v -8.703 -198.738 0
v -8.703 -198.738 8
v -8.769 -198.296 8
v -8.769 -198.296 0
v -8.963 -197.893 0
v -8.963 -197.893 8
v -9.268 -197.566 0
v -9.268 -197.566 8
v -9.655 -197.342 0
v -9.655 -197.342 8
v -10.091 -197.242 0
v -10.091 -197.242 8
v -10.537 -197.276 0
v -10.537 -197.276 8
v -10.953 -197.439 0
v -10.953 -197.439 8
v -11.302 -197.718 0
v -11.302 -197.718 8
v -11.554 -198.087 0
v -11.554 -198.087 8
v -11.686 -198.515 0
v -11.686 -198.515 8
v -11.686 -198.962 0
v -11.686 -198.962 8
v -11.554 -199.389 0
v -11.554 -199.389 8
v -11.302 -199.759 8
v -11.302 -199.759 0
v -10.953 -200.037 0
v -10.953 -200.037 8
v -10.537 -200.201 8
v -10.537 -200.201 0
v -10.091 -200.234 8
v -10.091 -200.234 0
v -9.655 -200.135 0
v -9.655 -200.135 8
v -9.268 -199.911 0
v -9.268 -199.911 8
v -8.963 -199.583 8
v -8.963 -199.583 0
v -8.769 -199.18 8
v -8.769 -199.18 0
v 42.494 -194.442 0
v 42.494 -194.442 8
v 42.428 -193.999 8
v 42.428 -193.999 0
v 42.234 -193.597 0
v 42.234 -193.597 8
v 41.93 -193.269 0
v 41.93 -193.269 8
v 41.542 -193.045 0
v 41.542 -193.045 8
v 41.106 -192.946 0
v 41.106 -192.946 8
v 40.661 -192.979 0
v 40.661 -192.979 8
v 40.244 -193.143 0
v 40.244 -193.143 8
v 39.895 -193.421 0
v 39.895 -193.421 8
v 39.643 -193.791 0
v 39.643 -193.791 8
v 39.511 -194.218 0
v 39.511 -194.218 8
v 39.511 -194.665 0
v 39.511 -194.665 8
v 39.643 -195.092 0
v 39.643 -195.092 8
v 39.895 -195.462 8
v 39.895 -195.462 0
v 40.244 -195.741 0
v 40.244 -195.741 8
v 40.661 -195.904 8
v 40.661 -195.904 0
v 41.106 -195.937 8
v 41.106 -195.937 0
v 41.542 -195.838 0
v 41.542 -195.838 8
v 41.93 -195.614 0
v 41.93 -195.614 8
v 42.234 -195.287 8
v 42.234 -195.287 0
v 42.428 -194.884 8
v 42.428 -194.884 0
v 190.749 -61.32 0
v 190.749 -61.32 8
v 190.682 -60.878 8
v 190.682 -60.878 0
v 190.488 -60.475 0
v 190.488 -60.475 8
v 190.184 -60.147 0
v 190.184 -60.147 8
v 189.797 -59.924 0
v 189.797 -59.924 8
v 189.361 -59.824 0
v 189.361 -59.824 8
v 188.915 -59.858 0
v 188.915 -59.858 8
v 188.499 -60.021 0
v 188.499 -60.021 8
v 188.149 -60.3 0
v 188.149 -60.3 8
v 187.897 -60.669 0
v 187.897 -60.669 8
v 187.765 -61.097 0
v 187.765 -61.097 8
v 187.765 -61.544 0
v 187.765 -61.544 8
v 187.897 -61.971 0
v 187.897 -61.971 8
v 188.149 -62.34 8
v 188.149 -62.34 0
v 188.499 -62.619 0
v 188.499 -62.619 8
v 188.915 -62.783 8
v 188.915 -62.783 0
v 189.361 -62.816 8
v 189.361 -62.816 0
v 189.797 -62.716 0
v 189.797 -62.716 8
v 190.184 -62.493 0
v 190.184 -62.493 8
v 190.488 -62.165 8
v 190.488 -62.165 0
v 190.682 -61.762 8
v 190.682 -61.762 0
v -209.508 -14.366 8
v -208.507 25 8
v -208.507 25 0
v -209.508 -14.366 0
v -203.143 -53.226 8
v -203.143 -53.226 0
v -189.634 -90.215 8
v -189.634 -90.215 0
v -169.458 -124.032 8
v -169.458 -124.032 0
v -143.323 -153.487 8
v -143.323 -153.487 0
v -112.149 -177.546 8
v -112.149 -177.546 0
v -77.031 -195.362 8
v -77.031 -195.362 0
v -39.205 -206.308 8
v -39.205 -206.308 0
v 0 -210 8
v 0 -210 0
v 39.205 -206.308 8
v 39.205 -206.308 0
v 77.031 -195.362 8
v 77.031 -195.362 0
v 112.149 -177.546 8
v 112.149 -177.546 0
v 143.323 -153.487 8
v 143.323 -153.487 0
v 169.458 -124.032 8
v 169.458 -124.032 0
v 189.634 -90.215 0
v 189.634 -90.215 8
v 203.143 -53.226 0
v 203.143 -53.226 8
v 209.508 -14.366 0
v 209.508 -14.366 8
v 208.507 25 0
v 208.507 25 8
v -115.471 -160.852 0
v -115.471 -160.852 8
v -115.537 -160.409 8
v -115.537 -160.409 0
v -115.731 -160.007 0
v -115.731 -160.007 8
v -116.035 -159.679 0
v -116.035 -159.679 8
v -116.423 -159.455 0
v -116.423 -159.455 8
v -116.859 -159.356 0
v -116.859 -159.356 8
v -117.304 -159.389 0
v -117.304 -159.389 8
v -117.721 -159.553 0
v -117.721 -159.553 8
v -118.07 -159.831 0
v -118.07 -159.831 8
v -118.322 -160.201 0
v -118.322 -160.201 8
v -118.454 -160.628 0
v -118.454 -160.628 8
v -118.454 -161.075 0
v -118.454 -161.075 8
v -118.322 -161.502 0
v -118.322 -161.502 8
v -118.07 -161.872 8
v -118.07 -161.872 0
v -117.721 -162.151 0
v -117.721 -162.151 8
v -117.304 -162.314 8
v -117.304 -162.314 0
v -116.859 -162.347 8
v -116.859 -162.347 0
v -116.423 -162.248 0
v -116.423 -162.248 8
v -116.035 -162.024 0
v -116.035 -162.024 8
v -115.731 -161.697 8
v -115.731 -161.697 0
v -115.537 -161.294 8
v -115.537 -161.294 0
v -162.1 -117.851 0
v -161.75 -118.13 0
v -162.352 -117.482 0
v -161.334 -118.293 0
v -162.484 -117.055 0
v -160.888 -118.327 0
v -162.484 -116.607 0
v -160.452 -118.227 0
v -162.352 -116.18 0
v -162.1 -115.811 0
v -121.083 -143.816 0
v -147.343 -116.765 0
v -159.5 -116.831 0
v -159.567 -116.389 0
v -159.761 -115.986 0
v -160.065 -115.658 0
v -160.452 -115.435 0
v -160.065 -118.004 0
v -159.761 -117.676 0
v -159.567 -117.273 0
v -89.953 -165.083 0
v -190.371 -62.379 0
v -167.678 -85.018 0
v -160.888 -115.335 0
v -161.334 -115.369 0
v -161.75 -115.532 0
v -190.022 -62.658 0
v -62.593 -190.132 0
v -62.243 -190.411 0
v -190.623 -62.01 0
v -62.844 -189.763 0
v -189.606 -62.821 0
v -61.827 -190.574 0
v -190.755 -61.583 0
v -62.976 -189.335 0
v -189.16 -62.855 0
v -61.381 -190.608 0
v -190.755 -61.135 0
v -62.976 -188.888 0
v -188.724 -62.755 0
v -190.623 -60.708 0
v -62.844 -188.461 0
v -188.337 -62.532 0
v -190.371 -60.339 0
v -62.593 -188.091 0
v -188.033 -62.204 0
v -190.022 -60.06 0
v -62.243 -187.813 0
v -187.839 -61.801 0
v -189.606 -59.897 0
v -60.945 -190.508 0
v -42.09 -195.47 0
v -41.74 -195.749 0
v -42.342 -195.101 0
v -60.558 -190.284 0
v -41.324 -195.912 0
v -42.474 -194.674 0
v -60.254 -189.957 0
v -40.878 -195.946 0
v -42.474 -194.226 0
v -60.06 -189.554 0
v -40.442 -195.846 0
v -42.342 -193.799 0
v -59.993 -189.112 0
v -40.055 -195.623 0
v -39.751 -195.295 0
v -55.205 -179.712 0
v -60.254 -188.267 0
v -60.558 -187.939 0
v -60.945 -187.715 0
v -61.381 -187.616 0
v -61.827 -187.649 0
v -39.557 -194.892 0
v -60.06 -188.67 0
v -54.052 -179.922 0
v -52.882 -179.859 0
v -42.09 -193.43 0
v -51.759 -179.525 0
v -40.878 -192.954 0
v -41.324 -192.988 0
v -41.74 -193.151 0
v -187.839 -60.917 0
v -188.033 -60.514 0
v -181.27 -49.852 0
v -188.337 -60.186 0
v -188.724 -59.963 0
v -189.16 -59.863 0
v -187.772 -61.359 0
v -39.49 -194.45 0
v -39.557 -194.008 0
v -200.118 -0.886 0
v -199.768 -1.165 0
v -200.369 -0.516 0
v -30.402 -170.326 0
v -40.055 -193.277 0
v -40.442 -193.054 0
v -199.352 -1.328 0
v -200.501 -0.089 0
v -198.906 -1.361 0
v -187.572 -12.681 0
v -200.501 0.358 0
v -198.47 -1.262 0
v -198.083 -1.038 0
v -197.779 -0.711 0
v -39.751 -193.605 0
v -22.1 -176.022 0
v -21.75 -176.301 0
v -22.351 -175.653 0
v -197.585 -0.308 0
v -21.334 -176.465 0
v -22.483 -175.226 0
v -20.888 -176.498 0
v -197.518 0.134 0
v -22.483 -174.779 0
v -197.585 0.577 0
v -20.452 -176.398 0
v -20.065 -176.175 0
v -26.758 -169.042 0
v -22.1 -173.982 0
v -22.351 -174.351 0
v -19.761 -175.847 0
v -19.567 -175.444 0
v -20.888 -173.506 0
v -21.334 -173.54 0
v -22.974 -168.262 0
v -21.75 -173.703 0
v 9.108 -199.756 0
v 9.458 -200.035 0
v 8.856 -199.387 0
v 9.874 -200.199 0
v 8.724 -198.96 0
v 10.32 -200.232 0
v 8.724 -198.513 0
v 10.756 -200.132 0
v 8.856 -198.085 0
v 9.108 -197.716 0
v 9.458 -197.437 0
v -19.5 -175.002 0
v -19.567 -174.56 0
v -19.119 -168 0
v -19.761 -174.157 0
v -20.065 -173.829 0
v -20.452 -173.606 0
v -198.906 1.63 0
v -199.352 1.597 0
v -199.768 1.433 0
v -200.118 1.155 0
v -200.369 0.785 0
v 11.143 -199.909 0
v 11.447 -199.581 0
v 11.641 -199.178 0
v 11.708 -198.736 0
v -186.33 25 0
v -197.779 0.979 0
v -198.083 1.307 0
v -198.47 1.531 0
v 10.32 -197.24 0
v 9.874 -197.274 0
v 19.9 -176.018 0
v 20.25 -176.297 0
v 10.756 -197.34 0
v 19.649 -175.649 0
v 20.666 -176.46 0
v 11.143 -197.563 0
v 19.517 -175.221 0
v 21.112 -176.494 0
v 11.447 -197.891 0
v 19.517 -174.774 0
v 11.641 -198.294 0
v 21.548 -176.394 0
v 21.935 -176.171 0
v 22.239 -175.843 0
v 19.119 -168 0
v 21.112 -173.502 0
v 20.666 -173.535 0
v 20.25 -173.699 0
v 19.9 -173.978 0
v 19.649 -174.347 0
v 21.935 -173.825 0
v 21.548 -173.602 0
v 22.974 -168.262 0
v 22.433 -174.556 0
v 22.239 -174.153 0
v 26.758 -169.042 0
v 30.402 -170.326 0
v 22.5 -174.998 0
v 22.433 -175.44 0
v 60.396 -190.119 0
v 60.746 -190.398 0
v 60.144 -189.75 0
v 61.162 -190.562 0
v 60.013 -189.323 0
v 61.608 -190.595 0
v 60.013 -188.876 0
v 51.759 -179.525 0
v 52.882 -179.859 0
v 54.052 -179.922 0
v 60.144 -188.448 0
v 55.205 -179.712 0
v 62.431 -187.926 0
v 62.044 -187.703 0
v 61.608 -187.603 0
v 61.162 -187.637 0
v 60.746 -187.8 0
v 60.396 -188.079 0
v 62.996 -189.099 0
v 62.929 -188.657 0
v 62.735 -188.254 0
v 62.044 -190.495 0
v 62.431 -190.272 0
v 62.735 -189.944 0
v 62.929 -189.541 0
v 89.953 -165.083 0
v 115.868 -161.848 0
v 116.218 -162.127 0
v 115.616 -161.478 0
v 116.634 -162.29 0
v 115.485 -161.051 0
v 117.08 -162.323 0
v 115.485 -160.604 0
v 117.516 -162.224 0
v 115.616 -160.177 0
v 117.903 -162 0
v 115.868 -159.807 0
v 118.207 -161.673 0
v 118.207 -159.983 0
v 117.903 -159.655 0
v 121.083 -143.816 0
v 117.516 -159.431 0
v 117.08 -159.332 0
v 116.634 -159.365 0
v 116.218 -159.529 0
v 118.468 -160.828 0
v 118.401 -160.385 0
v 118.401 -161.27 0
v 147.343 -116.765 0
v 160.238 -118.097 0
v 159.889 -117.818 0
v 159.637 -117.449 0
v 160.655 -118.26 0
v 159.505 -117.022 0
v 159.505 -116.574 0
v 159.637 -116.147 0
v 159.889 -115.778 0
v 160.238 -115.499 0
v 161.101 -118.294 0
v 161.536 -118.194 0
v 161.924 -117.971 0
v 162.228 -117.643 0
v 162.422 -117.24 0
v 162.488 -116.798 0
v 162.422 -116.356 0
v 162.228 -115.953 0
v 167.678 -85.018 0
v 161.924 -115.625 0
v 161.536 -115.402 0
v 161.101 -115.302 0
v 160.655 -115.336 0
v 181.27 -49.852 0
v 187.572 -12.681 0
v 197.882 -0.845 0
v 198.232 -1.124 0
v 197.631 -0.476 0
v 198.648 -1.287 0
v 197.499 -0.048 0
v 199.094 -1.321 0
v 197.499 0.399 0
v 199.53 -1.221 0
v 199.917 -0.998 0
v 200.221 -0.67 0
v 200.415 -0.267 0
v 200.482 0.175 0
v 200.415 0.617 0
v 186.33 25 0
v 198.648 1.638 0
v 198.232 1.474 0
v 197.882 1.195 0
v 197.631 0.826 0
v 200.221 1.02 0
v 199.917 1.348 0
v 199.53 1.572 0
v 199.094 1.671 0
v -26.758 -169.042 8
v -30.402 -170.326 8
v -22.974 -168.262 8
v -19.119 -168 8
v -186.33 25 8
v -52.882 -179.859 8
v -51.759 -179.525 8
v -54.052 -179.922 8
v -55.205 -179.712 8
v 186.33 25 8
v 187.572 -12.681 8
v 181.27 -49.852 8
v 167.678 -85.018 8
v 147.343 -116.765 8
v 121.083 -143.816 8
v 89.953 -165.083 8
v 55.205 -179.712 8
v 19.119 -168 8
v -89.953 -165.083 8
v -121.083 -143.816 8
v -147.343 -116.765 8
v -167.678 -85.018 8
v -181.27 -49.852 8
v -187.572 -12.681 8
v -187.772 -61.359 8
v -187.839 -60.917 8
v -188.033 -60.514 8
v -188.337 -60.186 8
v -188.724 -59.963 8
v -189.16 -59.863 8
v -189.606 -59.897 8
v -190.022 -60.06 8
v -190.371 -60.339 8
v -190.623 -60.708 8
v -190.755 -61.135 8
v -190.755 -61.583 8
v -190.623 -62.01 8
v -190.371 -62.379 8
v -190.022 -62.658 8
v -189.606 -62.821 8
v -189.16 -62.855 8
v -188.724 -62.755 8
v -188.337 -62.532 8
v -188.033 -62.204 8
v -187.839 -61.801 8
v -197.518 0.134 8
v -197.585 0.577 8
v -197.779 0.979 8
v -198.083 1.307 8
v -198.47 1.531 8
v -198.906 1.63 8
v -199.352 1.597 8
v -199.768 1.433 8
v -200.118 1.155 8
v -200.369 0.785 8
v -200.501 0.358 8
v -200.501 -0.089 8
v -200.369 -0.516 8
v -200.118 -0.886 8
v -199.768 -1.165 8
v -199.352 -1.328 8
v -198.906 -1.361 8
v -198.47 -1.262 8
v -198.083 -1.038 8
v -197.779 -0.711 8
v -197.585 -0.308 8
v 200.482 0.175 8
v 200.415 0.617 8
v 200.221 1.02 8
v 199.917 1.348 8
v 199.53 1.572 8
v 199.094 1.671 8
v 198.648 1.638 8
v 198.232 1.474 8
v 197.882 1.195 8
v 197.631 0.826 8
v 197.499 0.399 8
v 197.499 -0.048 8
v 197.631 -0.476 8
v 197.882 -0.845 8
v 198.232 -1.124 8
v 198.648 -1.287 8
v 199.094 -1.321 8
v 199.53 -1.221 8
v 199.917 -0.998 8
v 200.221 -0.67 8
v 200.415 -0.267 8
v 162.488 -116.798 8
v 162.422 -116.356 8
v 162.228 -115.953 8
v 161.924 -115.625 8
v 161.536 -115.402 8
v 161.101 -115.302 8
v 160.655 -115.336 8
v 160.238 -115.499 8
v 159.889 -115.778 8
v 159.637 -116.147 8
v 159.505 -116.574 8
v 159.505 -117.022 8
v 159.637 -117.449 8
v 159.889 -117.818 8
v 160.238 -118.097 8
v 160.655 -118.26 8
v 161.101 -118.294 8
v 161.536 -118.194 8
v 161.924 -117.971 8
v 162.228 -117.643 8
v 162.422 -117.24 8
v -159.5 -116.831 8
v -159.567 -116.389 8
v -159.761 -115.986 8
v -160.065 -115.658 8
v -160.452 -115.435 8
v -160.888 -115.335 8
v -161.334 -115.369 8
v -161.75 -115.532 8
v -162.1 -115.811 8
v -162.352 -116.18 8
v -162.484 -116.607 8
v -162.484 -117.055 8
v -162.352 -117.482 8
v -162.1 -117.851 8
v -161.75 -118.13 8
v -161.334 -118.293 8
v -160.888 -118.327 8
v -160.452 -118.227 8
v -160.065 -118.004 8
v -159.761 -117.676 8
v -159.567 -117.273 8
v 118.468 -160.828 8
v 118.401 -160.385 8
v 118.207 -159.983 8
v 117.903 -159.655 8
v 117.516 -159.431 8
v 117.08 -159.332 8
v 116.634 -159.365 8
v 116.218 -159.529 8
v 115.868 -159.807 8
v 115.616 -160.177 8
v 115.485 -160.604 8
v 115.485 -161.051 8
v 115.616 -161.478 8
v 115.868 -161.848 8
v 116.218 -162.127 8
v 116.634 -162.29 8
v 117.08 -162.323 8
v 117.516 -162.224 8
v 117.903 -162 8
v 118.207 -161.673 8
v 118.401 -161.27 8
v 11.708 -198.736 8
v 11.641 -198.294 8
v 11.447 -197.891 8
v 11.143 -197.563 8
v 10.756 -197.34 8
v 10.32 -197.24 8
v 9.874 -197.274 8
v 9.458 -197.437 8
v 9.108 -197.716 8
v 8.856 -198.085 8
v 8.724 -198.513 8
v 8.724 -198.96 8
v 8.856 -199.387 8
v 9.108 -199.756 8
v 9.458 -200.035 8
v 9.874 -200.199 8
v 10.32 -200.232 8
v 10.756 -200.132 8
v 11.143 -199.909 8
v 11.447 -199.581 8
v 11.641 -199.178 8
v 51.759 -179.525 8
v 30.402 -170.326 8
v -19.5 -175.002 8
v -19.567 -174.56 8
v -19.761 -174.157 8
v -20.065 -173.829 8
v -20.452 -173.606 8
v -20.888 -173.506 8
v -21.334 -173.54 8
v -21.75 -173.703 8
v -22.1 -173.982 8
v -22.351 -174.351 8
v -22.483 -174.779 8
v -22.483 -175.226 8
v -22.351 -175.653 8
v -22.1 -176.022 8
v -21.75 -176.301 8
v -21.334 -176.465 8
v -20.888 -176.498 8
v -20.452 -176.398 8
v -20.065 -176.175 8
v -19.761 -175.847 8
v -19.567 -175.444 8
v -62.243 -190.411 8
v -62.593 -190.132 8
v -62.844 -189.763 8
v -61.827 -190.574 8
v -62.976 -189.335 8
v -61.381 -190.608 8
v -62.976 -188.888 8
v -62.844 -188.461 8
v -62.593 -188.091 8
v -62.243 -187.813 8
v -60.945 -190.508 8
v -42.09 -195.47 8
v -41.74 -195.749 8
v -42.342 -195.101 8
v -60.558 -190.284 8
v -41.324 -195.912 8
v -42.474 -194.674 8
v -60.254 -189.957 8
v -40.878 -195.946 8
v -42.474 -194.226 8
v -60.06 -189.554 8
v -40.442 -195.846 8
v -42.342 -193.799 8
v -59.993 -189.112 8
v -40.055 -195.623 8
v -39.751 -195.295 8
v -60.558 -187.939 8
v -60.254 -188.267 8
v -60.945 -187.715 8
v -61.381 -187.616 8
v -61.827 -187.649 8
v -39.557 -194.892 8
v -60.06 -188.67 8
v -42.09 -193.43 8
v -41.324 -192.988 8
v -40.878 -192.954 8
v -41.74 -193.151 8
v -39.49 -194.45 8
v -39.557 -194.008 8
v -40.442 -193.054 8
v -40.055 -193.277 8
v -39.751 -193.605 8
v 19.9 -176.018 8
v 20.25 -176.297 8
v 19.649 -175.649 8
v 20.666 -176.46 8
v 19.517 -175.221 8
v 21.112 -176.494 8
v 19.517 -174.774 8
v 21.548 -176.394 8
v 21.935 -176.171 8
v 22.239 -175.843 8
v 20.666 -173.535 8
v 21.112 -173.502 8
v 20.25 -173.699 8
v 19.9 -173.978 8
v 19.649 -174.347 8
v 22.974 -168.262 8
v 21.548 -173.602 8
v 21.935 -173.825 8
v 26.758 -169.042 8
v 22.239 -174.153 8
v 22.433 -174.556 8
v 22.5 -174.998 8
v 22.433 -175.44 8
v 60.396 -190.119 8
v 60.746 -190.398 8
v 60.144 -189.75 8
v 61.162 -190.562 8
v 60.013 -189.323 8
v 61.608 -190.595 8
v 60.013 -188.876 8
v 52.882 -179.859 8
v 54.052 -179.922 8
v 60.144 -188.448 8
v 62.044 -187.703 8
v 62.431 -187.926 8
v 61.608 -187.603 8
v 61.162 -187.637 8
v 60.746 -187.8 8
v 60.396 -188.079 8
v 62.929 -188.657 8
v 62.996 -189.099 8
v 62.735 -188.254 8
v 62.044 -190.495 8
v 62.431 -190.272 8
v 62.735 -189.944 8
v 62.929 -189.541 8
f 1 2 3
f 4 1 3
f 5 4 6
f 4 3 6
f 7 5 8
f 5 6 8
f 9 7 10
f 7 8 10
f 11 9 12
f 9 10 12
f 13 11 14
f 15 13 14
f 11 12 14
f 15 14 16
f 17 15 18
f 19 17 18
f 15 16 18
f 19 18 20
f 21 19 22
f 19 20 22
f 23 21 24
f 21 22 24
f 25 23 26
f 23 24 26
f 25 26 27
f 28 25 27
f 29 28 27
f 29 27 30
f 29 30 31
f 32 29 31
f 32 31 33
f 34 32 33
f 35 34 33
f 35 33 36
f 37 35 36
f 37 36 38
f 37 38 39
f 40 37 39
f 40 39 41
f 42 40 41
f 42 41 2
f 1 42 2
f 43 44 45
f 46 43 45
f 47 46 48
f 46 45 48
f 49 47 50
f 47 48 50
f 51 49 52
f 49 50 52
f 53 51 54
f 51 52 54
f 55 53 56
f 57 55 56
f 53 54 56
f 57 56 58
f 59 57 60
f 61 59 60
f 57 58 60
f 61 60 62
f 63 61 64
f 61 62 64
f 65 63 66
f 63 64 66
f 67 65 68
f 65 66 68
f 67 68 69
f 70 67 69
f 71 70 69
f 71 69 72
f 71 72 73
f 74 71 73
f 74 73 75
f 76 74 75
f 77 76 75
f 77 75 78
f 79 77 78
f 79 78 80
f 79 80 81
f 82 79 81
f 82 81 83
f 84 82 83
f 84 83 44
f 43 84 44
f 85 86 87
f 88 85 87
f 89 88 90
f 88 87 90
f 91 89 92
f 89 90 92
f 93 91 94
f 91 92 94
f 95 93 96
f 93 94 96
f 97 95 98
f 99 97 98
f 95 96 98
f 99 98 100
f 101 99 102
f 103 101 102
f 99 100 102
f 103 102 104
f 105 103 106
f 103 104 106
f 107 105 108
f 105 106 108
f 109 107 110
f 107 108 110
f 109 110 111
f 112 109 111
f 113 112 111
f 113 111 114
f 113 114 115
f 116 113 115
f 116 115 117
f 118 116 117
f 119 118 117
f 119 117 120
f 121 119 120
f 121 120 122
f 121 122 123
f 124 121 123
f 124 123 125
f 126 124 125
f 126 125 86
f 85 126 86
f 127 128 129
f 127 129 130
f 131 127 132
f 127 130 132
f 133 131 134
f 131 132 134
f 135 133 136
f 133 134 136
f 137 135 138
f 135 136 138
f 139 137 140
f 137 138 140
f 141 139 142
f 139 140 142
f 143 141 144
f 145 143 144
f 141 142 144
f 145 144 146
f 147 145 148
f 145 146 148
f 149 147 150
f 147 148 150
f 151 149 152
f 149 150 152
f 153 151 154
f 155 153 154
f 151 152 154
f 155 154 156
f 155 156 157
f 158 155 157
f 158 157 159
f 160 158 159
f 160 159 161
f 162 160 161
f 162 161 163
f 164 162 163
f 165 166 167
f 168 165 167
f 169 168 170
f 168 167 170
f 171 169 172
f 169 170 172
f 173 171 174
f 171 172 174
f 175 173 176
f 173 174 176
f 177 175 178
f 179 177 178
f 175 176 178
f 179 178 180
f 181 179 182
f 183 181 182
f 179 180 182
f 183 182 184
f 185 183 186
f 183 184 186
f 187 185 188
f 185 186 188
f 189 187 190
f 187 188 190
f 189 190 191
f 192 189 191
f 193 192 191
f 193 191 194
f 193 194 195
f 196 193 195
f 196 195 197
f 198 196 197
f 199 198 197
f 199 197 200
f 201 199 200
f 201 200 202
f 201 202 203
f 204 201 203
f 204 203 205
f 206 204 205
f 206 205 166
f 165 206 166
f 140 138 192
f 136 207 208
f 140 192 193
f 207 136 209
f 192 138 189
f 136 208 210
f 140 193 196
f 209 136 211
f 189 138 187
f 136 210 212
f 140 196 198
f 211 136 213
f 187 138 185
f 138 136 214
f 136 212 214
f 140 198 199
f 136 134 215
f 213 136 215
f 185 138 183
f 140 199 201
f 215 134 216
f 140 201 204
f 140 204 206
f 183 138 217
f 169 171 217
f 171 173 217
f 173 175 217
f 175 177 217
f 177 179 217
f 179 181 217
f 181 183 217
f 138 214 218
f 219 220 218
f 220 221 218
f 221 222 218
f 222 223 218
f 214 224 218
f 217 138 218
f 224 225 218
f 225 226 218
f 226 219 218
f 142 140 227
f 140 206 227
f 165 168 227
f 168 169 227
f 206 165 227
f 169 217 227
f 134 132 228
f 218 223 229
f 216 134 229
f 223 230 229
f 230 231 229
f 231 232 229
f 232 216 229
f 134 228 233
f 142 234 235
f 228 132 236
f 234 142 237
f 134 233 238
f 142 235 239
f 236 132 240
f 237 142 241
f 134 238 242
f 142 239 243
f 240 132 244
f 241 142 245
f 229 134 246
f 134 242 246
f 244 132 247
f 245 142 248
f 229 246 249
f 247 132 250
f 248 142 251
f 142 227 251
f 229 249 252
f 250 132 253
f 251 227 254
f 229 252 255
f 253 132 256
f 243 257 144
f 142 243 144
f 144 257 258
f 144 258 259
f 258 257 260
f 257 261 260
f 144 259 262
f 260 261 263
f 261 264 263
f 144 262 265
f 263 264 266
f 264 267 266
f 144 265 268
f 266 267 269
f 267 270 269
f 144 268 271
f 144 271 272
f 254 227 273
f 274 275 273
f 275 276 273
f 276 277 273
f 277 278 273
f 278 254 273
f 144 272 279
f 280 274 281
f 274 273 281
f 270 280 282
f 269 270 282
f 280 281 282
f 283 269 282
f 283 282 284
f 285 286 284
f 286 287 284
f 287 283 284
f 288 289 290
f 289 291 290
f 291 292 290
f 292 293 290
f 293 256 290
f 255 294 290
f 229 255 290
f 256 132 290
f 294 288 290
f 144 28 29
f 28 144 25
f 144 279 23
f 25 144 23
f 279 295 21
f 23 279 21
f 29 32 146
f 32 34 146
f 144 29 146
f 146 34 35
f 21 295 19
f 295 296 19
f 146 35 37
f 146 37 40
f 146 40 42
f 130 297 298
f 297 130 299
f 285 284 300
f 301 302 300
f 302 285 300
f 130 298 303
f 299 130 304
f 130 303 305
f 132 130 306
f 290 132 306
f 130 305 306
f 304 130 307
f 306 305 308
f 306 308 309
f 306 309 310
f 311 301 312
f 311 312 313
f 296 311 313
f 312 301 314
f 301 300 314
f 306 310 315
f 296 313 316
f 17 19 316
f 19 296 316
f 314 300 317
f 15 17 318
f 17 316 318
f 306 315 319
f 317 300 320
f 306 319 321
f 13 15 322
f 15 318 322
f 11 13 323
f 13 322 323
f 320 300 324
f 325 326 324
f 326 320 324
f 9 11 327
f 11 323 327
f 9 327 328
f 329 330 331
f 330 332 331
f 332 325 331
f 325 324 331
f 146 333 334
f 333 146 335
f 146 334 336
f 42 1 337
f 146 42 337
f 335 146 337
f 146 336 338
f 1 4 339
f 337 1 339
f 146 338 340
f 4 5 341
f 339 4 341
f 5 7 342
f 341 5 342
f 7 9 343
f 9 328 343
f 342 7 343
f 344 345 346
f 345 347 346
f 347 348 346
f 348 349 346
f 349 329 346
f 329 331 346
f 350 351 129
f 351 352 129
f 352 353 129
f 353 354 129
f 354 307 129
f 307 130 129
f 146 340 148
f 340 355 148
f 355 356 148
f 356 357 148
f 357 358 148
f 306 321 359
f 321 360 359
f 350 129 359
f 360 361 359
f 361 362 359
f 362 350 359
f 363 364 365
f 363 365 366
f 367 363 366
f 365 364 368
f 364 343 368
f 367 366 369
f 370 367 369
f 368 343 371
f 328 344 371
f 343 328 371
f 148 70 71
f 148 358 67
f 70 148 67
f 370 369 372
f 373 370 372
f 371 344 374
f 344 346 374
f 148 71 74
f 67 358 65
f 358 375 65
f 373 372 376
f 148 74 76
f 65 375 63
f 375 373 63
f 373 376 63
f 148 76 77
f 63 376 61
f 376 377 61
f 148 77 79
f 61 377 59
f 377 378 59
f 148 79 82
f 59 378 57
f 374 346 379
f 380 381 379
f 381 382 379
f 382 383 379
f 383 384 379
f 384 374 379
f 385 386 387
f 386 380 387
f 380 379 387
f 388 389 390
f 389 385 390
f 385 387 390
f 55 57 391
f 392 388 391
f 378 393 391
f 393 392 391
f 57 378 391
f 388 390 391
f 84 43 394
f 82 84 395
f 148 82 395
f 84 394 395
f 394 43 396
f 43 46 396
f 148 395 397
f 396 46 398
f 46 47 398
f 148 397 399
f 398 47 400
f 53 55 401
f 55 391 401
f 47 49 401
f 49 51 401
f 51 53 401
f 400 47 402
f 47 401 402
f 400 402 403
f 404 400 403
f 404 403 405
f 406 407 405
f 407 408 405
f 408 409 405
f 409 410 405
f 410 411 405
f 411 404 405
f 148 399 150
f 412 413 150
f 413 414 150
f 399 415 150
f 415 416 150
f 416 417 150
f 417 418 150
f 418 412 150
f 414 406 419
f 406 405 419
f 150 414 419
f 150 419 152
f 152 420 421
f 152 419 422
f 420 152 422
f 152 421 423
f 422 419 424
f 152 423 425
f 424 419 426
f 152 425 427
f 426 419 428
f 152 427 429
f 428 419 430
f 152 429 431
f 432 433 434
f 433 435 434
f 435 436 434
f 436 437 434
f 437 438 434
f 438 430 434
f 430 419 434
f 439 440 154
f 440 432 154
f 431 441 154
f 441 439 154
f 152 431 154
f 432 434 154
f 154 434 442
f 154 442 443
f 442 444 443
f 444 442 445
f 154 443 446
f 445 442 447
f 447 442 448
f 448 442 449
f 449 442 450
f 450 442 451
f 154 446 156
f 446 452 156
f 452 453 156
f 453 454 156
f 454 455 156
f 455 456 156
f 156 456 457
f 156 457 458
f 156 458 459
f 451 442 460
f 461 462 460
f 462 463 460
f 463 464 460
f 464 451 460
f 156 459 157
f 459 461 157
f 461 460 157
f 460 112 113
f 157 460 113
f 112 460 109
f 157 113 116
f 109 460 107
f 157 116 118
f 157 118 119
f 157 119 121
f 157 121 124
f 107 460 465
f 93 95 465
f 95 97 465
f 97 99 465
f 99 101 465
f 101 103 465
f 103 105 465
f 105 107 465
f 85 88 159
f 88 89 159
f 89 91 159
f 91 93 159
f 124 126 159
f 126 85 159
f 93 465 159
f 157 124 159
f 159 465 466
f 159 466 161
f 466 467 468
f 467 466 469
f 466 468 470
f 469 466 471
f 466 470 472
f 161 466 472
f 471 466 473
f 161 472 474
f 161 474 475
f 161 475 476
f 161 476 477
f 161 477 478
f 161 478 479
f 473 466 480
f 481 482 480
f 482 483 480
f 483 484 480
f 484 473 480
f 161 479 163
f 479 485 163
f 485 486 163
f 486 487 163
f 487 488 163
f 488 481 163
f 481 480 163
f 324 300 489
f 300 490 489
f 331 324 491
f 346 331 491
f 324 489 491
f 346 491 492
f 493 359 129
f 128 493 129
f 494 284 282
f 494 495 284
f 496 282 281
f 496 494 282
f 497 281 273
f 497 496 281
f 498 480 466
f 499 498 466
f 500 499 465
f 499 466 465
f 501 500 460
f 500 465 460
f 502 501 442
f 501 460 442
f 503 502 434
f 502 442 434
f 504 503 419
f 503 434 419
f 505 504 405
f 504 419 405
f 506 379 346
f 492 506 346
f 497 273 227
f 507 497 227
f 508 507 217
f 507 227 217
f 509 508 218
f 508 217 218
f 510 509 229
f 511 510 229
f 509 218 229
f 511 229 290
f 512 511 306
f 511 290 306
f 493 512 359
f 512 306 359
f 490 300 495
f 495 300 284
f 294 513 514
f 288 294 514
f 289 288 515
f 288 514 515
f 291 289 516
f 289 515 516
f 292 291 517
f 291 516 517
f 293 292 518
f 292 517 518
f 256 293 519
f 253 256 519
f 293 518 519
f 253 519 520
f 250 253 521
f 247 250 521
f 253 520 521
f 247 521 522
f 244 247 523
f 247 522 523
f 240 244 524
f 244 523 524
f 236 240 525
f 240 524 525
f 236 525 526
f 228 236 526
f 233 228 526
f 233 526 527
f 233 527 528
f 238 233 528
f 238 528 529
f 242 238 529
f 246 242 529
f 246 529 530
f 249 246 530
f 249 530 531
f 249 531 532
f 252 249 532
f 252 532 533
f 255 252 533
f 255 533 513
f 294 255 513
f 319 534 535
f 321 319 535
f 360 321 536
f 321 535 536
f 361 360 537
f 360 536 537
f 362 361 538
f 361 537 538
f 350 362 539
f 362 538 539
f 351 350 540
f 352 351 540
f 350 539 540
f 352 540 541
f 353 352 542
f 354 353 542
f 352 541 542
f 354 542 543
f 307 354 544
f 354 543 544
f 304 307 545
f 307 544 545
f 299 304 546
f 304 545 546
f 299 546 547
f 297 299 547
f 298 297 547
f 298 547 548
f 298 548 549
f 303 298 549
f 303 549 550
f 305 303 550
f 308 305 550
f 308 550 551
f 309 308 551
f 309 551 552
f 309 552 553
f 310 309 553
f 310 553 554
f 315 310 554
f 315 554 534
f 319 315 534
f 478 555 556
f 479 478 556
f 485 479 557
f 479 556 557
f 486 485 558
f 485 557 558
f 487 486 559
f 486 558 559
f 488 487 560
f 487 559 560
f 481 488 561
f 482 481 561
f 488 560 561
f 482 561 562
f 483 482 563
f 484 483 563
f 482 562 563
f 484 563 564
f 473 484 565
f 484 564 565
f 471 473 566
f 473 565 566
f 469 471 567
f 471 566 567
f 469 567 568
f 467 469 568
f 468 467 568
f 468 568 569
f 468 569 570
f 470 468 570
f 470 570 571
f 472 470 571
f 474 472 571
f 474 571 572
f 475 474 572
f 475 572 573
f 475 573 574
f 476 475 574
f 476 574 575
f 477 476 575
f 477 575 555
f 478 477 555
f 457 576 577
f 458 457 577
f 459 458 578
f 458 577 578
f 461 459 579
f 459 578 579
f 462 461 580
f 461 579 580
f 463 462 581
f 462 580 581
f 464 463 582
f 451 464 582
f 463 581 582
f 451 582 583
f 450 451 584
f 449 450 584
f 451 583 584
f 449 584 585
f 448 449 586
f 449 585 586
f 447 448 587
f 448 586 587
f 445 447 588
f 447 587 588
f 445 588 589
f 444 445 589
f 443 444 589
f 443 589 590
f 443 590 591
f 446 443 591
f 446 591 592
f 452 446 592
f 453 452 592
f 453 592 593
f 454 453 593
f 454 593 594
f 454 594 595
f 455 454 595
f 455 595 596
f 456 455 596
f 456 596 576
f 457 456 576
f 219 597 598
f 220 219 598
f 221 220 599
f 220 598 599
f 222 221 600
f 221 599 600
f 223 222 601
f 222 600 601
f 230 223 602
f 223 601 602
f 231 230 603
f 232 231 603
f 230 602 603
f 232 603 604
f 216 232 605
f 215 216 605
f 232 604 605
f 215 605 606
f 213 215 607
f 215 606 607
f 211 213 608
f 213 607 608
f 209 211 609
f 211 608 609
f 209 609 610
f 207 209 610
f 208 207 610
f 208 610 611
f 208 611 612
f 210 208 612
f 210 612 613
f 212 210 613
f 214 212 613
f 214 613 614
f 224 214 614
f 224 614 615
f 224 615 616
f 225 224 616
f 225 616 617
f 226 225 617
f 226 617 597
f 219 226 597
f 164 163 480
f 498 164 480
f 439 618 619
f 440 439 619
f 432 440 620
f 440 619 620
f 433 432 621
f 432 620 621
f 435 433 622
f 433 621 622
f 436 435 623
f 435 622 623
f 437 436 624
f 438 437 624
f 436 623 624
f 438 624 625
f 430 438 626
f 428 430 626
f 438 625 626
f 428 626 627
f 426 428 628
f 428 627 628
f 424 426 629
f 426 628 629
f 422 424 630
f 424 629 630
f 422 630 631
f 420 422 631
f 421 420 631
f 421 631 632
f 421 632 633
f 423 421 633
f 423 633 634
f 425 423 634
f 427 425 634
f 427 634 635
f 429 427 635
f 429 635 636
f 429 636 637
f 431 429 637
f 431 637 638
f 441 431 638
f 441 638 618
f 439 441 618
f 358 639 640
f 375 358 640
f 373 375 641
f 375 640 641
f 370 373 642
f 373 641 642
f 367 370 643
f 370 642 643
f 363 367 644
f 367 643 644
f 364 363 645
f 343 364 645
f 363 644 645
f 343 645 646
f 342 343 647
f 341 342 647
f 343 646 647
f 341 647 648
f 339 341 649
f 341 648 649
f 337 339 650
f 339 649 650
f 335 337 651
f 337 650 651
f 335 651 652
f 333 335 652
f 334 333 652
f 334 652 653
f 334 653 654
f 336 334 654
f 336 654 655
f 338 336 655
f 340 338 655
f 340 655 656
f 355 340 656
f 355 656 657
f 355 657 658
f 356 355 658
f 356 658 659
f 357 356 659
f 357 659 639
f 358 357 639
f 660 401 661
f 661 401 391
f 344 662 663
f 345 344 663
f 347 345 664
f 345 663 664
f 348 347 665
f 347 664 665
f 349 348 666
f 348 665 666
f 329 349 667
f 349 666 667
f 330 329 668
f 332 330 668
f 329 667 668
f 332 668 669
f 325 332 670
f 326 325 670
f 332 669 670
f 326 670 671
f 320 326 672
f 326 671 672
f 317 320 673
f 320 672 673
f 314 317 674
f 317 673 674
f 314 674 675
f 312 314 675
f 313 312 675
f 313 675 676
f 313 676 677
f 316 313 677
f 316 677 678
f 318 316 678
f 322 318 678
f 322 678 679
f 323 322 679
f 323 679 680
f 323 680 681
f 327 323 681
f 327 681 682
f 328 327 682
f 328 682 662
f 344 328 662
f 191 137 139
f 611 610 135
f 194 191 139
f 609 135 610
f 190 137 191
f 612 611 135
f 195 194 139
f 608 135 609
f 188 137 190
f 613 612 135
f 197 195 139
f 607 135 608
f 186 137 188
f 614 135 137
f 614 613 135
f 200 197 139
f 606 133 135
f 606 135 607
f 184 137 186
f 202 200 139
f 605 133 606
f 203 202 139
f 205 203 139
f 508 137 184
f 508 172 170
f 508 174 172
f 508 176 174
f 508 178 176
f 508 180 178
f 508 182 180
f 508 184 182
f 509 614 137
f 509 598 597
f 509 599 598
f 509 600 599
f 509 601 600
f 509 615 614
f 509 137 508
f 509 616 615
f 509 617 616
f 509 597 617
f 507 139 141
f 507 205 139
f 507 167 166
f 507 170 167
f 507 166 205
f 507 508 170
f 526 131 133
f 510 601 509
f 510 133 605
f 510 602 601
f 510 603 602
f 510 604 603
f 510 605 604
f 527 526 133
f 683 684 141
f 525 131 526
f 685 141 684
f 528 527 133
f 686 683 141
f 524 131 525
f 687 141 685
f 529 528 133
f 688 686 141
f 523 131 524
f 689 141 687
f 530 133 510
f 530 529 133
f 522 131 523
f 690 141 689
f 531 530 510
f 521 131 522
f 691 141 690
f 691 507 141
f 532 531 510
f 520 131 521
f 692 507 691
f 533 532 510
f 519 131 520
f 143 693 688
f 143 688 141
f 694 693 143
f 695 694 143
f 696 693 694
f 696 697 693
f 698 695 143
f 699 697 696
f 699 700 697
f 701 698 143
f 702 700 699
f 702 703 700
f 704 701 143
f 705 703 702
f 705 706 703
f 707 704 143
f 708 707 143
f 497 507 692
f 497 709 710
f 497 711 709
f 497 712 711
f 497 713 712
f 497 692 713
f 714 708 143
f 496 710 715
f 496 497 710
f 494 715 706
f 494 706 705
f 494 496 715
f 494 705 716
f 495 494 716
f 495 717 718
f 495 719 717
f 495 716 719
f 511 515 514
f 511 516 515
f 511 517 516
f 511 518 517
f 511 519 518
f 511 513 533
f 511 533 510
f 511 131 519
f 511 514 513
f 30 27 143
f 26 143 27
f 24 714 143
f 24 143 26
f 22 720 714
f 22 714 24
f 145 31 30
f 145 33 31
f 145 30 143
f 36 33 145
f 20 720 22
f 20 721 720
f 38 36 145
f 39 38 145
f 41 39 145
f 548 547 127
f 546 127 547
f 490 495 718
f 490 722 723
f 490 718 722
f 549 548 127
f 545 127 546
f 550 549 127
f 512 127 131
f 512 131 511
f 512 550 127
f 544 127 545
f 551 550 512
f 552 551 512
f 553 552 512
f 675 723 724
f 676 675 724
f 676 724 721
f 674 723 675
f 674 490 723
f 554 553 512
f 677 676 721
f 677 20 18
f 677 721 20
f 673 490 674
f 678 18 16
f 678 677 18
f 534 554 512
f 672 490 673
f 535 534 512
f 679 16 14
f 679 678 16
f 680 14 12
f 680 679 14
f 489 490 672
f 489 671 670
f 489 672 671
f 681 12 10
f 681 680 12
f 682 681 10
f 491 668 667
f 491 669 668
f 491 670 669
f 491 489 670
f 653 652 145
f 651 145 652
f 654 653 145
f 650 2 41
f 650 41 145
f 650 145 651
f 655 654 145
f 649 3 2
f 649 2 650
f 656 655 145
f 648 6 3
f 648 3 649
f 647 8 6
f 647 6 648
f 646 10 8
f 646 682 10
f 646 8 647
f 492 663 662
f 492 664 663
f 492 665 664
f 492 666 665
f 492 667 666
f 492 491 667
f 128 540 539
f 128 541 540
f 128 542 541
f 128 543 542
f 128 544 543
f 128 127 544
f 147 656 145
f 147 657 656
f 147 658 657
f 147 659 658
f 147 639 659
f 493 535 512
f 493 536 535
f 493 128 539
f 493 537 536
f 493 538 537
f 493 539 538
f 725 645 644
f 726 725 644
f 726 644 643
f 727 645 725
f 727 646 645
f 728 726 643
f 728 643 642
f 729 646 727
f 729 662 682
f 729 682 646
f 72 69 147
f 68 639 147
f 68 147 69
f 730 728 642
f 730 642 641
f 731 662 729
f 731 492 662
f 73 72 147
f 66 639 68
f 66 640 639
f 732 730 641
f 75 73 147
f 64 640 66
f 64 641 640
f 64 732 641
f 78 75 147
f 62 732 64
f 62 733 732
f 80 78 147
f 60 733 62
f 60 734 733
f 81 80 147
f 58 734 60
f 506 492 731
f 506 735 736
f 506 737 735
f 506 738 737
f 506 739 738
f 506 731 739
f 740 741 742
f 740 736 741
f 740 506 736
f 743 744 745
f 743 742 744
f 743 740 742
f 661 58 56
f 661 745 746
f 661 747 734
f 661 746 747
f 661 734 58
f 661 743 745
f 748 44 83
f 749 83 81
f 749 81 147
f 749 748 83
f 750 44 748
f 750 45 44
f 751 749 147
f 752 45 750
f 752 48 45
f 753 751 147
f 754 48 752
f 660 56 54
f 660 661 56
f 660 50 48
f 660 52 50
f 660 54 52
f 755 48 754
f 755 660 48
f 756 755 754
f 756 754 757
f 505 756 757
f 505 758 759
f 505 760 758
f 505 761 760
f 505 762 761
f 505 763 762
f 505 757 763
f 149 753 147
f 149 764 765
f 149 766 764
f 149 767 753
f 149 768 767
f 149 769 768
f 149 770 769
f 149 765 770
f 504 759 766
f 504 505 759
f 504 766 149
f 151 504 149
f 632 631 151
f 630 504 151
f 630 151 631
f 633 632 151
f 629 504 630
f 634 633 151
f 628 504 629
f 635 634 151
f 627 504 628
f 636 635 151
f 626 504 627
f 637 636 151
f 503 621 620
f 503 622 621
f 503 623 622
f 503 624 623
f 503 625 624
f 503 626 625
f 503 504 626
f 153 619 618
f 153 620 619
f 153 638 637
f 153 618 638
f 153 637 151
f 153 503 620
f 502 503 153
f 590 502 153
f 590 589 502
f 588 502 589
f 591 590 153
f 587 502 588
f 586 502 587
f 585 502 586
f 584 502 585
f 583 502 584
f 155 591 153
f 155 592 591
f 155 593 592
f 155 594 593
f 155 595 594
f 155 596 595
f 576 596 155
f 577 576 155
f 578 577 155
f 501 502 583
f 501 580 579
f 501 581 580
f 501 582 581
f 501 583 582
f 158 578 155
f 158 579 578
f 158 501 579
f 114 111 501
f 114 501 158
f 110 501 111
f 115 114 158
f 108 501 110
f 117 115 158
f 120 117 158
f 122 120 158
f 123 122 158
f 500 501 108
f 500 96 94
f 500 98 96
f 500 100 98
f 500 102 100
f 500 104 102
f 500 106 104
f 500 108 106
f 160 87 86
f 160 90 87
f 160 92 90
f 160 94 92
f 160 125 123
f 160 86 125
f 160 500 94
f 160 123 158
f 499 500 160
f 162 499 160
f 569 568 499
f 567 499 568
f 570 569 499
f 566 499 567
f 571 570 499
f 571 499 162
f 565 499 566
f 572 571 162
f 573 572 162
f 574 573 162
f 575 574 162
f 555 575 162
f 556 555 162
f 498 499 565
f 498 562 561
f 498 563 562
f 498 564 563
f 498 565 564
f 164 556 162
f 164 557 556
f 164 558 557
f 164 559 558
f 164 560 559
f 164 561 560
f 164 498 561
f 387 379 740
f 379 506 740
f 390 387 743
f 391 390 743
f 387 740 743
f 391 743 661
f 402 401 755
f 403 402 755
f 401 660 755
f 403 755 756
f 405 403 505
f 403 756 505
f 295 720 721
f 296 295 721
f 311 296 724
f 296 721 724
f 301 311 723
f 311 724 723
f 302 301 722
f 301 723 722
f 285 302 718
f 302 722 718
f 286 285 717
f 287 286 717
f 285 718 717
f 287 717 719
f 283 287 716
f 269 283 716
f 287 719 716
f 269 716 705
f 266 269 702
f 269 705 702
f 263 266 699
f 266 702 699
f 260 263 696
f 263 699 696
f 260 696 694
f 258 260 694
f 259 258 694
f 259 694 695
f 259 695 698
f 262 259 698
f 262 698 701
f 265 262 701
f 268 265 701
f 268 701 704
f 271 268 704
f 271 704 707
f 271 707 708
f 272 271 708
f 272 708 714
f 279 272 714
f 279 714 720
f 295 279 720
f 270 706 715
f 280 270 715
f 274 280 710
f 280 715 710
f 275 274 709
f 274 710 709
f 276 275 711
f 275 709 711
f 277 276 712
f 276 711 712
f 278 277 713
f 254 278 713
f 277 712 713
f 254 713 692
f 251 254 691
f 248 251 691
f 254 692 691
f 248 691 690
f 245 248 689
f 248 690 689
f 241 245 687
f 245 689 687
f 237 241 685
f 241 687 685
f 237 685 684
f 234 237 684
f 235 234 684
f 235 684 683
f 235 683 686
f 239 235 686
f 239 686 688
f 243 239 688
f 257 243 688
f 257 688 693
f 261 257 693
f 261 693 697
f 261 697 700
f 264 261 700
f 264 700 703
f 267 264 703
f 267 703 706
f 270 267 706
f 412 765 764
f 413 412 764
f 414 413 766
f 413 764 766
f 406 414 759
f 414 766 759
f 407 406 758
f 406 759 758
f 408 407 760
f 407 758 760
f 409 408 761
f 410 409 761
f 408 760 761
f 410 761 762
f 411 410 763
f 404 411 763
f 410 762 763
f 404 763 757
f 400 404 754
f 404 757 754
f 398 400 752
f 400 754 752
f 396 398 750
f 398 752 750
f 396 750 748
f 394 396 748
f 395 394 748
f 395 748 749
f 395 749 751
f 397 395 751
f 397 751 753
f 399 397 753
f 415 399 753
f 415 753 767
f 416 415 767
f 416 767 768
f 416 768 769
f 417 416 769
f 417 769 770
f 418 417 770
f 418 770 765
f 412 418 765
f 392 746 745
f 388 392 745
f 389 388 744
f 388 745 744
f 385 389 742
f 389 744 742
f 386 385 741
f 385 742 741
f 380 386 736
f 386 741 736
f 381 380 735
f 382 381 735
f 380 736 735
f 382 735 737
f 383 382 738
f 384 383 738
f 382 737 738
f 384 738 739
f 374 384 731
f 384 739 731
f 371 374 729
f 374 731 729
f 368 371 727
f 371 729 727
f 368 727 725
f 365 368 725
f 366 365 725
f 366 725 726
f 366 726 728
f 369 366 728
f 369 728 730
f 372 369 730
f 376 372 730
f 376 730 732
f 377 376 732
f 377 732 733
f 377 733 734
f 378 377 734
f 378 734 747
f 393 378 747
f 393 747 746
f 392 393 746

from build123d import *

# Parameters (mm, degrees)
F1_DEPTH = 8
F2_R     = 1.5
F3_DEPTH = 8.001
F4_R     = 28.523991
F5_R     = 5


with BuildPart() as f1:
    # F0 (on Top) → F1 (new body)
    with BuildSketch(Plane.XY):
        with BuildLine():
            ThreePointArc((-53.434796, -180.246283), (-157.807923, -102.179545), (-186.330352, 25))
            Line((-186.330352, 25), (-208.506595, 25))
            ThreePointArc((-208.506595, 25), (0, -210), (208.506595, 25))
            Line((208.506595, 25), (186.330352, 25))
            ThreePointArc((186.330352, 25), (157.807923, -102.179545), (53.434796, -180.246283))
            Line((53.434796, -180.246283), (25, -168))
            Line((25, -168), (0, -168))
            Line((0, -168), (-25, -168))
            Line((-25, -168), (-53.434796, -180.246283))
        make_face()
    extrude(amount=F1_DEPTH)

    # F2 (on face) → F3 (cut, through all)
    with BuildSketch(Plane.XY.offset(8)):
        with Locations((-61.492936, -189.111742)):
            Circle(F2_R)
        with Locations((-116.970716, -160.851562)):
            Circle(F2_R)
        with Locations((-161.000343, -116.830956)):
            Circle(F2_R)
        with Locations((-189.271892, -61.35897)):
            Circle(F2_R)
        with Locations((-199.017947, 0.134414)):
            Circle(F2_R)
        with Locations((61.495827, -189.09914)):
            Circle(F2_R)
        with Locations((116.967814, -160.827591)):
            Circle(F2_R)
        with Locations((160.988419, -116.797963)):
            Circle(F2_R)
        with Locations((189.248599, -61.320184)):
            Circle(F2_R)
        with Locations((198.982051, 0.175196)):
            Circle(F2_R)
        with Locations((-21, -175.002152)):
            Circle(F2_R)
        with Locations((-40.990327, -194.449982)):
            Circle(F2_R)
        with Locations((-10.202835, -198.738276)):
            Circle(F2_R)
        with Locations((21, -174.997848)):
            Circle(F2_R)
        with Locations((10.2077, -198.736184)):
            Circle(F2_R)
        with Locations((40.994312, -194.441581)):
            Circle(F2_R)
    extrude(amount=-F3_DEPTH, mode=Mode.SUBTRACT)

    # F4
    f4_edges = [f1.edges().sort_by_distance(p)[0] for p in [
        (25, -168, 4),
        (-25, -168, 4),
    ]]
    fillet(f4_edges, radius=F4_R)

    # F5
    f5_edges = [f1.edges().sort_by_distance(p)[0] for p in [
        (53.434796, -180.246283, 4),
        (-53.434796, -180.246283, 4),
    ]]
    fillet(f5_edges, radius=F5_R)


solid = f1.part
